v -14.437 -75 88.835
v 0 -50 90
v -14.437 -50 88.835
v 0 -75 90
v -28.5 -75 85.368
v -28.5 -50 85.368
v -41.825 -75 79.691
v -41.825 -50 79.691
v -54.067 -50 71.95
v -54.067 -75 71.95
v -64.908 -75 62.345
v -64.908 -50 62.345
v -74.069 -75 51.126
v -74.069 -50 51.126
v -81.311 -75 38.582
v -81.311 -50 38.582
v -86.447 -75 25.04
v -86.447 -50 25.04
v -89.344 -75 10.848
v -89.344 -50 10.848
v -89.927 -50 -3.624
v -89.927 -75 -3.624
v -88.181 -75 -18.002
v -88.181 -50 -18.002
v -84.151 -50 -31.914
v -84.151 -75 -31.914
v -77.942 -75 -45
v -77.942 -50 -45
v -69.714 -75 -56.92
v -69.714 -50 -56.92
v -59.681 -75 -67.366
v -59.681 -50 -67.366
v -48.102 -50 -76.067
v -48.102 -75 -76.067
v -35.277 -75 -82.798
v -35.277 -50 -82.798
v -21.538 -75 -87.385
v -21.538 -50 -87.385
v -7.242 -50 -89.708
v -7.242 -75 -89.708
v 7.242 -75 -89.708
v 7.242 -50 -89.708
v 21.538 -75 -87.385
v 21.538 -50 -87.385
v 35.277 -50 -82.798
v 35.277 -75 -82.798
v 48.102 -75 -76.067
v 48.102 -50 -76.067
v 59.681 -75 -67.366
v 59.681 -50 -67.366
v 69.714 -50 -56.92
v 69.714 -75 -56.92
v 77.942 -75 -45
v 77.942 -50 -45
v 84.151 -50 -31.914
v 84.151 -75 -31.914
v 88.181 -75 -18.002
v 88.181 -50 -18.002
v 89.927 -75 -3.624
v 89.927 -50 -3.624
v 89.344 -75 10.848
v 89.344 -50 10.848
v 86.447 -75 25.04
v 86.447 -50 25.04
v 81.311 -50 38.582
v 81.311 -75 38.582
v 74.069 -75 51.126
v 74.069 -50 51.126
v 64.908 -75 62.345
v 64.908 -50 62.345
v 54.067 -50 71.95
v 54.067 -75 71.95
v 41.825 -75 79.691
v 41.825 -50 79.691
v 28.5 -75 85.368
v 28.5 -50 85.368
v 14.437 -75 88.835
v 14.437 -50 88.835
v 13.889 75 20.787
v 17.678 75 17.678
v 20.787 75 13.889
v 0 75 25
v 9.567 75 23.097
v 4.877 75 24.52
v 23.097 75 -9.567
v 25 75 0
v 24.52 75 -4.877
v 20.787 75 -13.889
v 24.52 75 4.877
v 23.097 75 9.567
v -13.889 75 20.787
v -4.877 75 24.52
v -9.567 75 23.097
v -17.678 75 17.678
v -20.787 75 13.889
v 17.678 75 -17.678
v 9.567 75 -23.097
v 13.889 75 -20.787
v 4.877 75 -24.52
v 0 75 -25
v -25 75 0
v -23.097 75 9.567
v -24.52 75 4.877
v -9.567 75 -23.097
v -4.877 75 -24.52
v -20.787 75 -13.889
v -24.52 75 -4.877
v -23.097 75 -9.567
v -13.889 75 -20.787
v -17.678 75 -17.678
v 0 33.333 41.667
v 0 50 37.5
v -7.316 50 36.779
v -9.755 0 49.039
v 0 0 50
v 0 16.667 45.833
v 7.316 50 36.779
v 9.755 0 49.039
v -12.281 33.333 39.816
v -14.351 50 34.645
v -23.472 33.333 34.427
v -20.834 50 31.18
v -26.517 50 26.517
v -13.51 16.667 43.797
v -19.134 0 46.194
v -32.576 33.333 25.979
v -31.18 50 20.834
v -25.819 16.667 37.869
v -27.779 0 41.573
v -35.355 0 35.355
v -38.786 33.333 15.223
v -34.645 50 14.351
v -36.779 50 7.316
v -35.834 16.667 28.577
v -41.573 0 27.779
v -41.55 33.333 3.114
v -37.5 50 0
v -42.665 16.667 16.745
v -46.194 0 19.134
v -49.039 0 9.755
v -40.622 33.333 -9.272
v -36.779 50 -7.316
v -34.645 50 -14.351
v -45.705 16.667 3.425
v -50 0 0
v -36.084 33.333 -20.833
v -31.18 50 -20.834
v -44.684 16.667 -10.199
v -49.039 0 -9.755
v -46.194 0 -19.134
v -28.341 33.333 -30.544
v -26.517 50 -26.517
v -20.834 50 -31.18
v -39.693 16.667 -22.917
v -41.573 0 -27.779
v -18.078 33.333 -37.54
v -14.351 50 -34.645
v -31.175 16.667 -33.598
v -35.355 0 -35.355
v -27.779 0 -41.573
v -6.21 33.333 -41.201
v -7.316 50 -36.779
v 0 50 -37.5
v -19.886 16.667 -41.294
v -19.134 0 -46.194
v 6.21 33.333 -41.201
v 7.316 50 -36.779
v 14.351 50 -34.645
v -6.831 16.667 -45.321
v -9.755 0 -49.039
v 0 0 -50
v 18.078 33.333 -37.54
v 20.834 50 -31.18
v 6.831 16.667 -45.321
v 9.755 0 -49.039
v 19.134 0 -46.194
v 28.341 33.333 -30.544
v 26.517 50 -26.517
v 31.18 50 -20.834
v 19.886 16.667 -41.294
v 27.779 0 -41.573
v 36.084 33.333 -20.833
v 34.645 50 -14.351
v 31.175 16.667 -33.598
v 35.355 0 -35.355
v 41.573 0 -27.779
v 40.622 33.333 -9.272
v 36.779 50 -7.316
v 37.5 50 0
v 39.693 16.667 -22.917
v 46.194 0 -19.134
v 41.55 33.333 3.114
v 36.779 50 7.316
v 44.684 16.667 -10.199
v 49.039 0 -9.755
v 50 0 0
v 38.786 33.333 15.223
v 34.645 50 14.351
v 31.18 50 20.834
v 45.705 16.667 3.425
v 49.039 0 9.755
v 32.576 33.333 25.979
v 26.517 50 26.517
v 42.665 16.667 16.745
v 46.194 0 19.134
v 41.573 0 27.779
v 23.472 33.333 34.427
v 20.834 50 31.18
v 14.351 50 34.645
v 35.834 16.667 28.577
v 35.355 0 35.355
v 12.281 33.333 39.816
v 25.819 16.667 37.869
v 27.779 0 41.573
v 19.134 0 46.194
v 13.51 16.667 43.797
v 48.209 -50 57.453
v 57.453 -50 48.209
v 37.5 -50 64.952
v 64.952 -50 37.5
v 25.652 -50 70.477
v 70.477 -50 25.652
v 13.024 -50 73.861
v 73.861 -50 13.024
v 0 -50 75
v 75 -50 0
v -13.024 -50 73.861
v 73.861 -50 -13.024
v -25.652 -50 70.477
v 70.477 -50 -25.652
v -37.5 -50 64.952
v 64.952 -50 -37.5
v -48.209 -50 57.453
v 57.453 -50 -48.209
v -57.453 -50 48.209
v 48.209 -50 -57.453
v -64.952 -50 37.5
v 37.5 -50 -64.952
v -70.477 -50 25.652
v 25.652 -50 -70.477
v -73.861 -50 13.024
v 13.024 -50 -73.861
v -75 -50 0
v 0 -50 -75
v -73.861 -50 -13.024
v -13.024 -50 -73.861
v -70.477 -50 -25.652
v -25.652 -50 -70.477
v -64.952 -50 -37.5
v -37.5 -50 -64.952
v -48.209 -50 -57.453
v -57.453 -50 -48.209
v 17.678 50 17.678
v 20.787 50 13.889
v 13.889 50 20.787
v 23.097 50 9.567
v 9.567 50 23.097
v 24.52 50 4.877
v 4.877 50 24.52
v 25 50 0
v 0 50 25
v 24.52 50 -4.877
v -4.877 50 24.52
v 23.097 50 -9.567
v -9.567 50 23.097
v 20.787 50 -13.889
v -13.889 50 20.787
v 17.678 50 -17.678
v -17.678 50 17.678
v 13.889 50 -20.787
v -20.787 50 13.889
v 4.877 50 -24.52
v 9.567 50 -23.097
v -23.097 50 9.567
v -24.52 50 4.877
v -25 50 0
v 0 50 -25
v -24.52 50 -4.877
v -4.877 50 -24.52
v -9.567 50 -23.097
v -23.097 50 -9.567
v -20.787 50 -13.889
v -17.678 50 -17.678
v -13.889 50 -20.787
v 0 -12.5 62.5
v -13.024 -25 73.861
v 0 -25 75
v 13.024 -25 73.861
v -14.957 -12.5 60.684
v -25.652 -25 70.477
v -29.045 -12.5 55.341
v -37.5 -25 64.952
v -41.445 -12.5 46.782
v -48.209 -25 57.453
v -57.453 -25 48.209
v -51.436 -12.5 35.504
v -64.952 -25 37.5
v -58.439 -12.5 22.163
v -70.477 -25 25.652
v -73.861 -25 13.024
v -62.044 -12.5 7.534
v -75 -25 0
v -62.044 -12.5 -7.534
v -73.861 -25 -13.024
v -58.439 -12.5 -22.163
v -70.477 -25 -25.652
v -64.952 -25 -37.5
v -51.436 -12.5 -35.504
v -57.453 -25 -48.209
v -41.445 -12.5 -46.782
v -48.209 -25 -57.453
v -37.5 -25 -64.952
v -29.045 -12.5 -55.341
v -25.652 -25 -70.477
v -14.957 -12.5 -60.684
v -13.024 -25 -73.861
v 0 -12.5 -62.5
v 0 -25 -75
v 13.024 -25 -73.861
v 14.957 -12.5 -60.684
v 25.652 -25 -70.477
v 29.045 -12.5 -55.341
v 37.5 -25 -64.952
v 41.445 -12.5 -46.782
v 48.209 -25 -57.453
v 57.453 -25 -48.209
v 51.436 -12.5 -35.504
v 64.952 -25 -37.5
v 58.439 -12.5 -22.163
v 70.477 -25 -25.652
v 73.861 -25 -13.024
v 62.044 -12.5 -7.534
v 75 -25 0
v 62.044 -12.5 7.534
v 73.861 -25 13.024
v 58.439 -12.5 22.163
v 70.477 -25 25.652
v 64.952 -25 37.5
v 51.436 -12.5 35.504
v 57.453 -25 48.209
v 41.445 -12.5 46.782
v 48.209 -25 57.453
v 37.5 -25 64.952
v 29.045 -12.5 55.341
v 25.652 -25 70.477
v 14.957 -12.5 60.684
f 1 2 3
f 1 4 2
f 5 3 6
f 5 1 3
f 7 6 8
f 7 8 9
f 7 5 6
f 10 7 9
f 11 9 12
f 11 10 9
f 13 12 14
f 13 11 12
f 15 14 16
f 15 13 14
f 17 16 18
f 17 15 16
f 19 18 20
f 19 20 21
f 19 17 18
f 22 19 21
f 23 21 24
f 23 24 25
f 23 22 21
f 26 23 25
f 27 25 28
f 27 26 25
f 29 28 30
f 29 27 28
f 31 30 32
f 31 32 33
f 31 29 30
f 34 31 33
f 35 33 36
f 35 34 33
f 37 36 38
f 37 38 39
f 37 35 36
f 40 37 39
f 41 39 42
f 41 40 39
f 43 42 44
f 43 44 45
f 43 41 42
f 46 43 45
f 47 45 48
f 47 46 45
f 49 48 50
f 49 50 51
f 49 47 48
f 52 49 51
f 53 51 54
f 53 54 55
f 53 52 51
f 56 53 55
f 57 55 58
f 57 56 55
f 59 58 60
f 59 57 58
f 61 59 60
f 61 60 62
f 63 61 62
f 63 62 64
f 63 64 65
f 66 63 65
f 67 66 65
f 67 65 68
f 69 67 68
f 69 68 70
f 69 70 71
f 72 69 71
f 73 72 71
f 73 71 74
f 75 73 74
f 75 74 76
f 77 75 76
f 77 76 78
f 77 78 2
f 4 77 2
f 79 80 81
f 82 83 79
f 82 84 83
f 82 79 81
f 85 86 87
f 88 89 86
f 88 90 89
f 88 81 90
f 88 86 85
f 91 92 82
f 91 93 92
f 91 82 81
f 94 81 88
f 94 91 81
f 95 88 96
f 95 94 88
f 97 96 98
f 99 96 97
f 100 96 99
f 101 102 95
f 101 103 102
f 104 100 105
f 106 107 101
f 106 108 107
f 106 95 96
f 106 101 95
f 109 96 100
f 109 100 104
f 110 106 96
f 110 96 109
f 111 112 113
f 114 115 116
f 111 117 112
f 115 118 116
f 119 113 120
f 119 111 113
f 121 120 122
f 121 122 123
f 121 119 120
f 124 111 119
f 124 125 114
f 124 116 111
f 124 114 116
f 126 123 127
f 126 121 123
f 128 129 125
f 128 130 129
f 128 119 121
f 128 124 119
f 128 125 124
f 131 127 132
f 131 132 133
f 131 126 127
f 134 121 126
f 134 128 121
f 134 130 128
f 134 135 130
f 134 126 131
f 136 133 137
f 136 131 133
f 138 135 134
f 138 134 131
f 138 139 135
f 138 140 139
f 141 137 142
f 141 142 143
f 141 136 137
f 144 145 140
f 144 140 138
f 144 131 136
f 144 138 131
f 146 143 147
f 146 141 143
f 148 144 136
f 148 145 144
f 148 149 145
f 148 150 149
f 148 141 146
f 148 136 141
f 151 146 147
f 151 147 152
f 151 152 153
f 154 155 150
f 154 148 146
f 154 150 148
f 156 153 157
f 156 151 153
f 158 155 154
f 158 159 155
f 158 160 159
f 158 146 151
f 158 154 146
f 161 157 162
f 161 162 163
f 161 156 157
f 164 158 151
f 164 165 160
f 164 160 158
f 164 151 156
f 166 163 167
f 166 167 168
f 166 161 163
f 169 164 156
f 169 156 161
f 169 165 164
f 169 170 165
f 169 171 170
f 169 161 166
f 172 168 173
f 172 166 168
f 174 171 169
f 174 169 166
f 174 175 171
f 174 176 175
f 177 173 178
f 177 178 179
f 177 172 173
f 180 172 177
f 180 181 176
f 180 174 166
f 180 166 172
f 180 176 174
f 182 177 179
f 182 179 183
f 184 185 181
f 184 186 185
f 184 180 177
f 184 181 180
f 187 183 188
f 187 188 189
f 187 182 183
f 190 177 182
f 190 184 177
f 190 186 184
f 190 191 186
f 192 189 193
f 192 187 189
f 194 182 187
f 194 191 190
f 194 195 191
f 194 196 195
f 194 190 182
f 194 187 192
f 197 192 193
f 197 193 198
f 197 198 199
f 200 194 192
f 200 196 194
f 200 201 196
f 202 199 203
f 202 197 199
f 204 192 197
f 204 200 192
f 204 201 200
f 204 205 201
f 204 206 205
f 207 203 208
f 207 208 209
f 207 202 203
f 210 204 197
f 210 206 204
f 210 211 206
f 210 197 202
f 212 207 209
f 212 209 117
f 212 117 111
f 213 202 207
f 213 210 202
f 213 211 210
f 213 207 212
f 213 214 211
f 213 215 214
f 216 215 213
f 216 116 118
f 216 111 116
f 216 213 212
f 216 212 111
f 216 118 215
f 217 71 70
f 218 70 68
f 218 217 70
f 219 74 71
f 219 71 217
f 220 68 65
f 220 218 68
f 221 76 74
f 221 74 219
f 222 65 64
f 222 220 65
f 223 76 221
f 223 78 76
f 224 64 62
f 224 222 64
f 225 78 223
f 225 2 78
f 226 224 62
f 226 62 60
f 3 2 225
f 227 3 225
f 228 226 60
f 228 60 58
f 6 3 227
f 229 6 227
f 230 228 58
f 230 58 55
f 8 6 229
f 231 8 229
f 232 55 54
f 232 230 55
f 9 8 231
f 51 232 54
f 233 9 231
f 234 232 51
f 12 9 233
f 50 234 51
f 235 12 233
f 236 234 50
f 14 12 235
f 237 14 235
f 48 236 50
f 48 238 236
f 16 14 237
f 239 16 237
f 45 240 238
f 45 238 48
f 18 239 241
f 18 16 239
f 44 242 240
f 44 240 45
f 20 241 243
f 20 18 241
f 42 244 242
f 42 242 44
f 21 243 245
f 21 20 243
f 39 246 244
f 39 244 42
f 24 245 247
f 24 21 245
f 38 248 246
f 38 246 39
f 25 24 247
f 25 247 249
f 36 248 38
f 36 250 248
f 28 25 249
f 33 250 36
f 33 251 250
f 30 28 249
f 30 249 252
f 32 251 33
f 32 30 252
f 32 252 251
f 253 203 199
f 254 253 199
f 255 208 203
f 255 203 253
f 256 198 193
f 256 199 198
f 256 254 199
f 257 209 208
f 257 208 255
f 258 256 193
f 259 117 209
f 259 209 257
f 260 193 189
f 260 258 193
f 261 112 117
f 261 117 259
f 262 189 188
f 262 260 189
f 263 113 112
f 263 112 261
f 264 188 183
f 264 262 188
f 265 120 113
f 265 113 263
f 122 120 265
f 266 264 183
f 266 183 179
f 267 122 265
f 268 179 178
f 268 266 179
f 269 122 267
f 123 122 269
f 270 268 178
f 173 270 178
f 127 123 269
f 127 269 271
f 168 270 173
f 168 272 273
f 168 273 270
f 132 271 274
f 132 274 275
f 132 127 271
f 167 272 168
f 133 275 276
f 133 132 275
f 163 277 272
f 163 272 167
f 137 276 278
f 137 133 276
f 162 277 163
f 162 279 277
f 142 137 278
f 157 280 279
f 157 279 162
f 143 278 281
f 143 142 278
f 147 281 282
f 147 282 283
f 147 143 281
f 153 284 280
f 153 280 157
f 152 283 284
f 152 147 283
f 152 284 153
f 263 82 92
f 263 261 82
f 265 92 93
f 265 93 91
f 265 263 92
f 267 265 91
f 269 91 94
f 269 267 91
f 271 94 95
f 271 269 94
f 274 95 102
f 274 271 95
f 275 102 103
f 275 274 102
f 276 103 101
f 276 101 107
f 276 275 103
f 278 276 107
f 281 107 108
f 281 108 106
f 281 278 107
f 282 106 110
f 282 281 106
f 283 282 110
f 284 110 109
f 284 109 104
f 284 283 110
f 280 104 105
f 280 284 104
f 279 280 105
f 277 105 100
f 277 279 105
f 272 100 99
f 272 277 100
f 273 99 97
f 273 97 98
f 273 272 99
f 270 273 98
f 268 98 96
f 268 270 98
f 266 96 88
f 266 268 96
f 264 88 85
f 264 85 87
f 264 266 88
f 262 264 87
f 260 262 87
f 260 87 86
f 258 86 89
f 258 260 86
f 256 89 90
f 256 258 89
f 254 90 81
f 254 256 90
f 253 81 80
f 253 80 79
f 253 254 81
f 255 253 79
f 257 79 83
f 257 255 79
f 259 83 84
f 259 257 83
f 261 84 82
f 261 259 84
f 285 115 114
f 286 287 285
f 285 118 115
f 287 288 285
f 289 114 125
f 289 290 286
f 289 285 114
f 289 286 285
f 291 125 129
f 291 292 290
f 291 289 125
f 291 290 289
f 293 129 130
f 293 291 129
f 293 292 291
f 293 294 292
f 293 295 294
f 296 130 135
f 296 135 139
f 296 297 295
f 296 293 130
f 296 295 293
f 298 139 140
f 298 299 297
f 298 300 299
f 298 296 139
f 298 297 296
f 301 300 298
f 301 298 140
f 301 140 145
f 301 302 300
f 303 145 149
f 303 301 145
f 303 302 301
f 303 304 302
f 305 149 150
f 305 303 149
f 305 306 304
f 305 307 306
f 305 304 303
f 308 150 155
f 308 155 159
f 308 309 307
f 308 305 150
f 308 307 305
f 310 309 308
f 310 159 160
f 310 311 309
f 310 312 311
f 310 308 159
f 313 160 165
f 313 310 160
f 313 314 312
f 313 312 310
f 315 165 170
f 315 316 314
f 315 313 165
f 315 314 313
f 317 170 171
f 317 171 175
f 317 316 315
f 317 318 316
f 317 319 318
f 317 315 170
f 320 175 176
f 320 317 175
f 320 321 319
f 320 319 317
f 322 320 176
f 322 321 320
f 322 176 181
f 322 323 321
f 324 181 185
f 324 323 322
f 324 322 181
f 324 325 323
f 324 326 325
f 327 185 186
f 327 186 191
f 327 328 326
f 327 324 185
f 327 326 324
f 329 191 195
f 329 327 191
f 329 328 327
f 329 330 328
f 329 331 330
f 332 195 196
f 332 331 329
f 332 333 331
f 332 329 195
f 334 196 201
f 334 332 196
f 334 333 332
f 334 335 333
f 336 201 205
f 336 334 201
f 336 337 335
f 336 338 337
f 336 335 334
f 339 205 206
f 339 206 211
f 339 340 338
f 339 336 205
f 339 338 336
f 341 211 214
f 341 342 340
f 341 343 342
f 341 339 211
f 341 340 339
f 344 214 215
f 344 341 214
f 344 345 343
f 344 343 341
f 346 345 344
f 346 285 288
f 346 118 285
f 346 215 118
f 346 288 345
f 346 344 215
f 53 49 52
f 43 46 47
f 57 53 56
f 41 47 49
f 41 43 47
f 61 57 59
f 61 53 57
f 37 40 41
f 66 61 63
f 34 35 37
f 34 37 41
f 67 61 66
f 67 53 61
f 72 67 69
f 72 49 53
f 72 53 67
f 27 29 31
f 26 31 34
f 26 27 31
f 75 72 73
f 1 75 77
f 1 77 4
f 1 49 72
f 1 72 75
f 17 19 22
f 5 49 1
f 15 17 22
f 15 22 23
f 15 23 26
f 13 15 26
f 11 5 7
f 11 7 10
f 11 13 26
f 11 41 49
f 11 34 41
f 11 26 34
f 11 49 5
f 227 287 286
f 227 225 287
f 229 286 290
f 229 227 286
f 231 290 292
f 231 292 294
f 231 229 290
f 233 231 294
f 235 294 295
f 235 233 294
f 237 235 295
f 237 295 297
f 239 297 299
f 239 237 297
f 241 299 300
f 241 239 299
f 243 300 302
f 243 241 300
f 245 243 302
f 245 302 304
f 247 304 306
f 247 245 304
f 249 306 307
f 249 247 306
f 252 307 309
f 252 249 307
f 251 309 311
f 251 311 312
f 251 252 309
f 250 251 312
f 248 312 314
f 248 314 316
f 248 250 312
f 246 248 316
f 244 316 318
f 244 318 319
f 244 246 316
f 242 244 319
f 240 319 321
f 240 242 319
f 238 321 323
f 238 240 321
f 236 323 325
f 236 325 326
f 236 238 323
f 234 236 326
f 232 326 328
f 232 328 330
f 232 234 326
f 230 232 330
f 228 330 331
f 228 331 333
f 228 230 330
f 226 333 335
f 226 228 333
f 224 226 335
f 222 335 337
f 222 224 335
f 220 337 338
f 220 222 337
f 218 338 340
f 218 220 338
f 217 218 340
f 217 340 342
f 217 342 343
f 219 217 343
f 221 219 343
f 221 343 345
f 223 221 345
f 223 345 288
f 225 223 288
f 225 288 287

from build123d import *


with BuildPart() as part:
    # Esboço1 → Revolução1 (revolve)
    with BuildSketch(Plane.XY, mode=Mode.PRIVATE) as revolu_o1_sk:
        Polygon((0, 75), (25, 75), (25, 50), (37.5, 50), (50, 0), (75, -25), (75, -50), (90, -50), (90, -75), (0, -75), align=None)
    revolve(revolu_o1_sk.sketch.rotate(Axis((0, 54.909632035, 0), (0, -1, 0)), 90), axis=Axis((0, 54.909632035, 0), (0, -1, 0)))  # turned: the seam where the file's is


solid = part.part
